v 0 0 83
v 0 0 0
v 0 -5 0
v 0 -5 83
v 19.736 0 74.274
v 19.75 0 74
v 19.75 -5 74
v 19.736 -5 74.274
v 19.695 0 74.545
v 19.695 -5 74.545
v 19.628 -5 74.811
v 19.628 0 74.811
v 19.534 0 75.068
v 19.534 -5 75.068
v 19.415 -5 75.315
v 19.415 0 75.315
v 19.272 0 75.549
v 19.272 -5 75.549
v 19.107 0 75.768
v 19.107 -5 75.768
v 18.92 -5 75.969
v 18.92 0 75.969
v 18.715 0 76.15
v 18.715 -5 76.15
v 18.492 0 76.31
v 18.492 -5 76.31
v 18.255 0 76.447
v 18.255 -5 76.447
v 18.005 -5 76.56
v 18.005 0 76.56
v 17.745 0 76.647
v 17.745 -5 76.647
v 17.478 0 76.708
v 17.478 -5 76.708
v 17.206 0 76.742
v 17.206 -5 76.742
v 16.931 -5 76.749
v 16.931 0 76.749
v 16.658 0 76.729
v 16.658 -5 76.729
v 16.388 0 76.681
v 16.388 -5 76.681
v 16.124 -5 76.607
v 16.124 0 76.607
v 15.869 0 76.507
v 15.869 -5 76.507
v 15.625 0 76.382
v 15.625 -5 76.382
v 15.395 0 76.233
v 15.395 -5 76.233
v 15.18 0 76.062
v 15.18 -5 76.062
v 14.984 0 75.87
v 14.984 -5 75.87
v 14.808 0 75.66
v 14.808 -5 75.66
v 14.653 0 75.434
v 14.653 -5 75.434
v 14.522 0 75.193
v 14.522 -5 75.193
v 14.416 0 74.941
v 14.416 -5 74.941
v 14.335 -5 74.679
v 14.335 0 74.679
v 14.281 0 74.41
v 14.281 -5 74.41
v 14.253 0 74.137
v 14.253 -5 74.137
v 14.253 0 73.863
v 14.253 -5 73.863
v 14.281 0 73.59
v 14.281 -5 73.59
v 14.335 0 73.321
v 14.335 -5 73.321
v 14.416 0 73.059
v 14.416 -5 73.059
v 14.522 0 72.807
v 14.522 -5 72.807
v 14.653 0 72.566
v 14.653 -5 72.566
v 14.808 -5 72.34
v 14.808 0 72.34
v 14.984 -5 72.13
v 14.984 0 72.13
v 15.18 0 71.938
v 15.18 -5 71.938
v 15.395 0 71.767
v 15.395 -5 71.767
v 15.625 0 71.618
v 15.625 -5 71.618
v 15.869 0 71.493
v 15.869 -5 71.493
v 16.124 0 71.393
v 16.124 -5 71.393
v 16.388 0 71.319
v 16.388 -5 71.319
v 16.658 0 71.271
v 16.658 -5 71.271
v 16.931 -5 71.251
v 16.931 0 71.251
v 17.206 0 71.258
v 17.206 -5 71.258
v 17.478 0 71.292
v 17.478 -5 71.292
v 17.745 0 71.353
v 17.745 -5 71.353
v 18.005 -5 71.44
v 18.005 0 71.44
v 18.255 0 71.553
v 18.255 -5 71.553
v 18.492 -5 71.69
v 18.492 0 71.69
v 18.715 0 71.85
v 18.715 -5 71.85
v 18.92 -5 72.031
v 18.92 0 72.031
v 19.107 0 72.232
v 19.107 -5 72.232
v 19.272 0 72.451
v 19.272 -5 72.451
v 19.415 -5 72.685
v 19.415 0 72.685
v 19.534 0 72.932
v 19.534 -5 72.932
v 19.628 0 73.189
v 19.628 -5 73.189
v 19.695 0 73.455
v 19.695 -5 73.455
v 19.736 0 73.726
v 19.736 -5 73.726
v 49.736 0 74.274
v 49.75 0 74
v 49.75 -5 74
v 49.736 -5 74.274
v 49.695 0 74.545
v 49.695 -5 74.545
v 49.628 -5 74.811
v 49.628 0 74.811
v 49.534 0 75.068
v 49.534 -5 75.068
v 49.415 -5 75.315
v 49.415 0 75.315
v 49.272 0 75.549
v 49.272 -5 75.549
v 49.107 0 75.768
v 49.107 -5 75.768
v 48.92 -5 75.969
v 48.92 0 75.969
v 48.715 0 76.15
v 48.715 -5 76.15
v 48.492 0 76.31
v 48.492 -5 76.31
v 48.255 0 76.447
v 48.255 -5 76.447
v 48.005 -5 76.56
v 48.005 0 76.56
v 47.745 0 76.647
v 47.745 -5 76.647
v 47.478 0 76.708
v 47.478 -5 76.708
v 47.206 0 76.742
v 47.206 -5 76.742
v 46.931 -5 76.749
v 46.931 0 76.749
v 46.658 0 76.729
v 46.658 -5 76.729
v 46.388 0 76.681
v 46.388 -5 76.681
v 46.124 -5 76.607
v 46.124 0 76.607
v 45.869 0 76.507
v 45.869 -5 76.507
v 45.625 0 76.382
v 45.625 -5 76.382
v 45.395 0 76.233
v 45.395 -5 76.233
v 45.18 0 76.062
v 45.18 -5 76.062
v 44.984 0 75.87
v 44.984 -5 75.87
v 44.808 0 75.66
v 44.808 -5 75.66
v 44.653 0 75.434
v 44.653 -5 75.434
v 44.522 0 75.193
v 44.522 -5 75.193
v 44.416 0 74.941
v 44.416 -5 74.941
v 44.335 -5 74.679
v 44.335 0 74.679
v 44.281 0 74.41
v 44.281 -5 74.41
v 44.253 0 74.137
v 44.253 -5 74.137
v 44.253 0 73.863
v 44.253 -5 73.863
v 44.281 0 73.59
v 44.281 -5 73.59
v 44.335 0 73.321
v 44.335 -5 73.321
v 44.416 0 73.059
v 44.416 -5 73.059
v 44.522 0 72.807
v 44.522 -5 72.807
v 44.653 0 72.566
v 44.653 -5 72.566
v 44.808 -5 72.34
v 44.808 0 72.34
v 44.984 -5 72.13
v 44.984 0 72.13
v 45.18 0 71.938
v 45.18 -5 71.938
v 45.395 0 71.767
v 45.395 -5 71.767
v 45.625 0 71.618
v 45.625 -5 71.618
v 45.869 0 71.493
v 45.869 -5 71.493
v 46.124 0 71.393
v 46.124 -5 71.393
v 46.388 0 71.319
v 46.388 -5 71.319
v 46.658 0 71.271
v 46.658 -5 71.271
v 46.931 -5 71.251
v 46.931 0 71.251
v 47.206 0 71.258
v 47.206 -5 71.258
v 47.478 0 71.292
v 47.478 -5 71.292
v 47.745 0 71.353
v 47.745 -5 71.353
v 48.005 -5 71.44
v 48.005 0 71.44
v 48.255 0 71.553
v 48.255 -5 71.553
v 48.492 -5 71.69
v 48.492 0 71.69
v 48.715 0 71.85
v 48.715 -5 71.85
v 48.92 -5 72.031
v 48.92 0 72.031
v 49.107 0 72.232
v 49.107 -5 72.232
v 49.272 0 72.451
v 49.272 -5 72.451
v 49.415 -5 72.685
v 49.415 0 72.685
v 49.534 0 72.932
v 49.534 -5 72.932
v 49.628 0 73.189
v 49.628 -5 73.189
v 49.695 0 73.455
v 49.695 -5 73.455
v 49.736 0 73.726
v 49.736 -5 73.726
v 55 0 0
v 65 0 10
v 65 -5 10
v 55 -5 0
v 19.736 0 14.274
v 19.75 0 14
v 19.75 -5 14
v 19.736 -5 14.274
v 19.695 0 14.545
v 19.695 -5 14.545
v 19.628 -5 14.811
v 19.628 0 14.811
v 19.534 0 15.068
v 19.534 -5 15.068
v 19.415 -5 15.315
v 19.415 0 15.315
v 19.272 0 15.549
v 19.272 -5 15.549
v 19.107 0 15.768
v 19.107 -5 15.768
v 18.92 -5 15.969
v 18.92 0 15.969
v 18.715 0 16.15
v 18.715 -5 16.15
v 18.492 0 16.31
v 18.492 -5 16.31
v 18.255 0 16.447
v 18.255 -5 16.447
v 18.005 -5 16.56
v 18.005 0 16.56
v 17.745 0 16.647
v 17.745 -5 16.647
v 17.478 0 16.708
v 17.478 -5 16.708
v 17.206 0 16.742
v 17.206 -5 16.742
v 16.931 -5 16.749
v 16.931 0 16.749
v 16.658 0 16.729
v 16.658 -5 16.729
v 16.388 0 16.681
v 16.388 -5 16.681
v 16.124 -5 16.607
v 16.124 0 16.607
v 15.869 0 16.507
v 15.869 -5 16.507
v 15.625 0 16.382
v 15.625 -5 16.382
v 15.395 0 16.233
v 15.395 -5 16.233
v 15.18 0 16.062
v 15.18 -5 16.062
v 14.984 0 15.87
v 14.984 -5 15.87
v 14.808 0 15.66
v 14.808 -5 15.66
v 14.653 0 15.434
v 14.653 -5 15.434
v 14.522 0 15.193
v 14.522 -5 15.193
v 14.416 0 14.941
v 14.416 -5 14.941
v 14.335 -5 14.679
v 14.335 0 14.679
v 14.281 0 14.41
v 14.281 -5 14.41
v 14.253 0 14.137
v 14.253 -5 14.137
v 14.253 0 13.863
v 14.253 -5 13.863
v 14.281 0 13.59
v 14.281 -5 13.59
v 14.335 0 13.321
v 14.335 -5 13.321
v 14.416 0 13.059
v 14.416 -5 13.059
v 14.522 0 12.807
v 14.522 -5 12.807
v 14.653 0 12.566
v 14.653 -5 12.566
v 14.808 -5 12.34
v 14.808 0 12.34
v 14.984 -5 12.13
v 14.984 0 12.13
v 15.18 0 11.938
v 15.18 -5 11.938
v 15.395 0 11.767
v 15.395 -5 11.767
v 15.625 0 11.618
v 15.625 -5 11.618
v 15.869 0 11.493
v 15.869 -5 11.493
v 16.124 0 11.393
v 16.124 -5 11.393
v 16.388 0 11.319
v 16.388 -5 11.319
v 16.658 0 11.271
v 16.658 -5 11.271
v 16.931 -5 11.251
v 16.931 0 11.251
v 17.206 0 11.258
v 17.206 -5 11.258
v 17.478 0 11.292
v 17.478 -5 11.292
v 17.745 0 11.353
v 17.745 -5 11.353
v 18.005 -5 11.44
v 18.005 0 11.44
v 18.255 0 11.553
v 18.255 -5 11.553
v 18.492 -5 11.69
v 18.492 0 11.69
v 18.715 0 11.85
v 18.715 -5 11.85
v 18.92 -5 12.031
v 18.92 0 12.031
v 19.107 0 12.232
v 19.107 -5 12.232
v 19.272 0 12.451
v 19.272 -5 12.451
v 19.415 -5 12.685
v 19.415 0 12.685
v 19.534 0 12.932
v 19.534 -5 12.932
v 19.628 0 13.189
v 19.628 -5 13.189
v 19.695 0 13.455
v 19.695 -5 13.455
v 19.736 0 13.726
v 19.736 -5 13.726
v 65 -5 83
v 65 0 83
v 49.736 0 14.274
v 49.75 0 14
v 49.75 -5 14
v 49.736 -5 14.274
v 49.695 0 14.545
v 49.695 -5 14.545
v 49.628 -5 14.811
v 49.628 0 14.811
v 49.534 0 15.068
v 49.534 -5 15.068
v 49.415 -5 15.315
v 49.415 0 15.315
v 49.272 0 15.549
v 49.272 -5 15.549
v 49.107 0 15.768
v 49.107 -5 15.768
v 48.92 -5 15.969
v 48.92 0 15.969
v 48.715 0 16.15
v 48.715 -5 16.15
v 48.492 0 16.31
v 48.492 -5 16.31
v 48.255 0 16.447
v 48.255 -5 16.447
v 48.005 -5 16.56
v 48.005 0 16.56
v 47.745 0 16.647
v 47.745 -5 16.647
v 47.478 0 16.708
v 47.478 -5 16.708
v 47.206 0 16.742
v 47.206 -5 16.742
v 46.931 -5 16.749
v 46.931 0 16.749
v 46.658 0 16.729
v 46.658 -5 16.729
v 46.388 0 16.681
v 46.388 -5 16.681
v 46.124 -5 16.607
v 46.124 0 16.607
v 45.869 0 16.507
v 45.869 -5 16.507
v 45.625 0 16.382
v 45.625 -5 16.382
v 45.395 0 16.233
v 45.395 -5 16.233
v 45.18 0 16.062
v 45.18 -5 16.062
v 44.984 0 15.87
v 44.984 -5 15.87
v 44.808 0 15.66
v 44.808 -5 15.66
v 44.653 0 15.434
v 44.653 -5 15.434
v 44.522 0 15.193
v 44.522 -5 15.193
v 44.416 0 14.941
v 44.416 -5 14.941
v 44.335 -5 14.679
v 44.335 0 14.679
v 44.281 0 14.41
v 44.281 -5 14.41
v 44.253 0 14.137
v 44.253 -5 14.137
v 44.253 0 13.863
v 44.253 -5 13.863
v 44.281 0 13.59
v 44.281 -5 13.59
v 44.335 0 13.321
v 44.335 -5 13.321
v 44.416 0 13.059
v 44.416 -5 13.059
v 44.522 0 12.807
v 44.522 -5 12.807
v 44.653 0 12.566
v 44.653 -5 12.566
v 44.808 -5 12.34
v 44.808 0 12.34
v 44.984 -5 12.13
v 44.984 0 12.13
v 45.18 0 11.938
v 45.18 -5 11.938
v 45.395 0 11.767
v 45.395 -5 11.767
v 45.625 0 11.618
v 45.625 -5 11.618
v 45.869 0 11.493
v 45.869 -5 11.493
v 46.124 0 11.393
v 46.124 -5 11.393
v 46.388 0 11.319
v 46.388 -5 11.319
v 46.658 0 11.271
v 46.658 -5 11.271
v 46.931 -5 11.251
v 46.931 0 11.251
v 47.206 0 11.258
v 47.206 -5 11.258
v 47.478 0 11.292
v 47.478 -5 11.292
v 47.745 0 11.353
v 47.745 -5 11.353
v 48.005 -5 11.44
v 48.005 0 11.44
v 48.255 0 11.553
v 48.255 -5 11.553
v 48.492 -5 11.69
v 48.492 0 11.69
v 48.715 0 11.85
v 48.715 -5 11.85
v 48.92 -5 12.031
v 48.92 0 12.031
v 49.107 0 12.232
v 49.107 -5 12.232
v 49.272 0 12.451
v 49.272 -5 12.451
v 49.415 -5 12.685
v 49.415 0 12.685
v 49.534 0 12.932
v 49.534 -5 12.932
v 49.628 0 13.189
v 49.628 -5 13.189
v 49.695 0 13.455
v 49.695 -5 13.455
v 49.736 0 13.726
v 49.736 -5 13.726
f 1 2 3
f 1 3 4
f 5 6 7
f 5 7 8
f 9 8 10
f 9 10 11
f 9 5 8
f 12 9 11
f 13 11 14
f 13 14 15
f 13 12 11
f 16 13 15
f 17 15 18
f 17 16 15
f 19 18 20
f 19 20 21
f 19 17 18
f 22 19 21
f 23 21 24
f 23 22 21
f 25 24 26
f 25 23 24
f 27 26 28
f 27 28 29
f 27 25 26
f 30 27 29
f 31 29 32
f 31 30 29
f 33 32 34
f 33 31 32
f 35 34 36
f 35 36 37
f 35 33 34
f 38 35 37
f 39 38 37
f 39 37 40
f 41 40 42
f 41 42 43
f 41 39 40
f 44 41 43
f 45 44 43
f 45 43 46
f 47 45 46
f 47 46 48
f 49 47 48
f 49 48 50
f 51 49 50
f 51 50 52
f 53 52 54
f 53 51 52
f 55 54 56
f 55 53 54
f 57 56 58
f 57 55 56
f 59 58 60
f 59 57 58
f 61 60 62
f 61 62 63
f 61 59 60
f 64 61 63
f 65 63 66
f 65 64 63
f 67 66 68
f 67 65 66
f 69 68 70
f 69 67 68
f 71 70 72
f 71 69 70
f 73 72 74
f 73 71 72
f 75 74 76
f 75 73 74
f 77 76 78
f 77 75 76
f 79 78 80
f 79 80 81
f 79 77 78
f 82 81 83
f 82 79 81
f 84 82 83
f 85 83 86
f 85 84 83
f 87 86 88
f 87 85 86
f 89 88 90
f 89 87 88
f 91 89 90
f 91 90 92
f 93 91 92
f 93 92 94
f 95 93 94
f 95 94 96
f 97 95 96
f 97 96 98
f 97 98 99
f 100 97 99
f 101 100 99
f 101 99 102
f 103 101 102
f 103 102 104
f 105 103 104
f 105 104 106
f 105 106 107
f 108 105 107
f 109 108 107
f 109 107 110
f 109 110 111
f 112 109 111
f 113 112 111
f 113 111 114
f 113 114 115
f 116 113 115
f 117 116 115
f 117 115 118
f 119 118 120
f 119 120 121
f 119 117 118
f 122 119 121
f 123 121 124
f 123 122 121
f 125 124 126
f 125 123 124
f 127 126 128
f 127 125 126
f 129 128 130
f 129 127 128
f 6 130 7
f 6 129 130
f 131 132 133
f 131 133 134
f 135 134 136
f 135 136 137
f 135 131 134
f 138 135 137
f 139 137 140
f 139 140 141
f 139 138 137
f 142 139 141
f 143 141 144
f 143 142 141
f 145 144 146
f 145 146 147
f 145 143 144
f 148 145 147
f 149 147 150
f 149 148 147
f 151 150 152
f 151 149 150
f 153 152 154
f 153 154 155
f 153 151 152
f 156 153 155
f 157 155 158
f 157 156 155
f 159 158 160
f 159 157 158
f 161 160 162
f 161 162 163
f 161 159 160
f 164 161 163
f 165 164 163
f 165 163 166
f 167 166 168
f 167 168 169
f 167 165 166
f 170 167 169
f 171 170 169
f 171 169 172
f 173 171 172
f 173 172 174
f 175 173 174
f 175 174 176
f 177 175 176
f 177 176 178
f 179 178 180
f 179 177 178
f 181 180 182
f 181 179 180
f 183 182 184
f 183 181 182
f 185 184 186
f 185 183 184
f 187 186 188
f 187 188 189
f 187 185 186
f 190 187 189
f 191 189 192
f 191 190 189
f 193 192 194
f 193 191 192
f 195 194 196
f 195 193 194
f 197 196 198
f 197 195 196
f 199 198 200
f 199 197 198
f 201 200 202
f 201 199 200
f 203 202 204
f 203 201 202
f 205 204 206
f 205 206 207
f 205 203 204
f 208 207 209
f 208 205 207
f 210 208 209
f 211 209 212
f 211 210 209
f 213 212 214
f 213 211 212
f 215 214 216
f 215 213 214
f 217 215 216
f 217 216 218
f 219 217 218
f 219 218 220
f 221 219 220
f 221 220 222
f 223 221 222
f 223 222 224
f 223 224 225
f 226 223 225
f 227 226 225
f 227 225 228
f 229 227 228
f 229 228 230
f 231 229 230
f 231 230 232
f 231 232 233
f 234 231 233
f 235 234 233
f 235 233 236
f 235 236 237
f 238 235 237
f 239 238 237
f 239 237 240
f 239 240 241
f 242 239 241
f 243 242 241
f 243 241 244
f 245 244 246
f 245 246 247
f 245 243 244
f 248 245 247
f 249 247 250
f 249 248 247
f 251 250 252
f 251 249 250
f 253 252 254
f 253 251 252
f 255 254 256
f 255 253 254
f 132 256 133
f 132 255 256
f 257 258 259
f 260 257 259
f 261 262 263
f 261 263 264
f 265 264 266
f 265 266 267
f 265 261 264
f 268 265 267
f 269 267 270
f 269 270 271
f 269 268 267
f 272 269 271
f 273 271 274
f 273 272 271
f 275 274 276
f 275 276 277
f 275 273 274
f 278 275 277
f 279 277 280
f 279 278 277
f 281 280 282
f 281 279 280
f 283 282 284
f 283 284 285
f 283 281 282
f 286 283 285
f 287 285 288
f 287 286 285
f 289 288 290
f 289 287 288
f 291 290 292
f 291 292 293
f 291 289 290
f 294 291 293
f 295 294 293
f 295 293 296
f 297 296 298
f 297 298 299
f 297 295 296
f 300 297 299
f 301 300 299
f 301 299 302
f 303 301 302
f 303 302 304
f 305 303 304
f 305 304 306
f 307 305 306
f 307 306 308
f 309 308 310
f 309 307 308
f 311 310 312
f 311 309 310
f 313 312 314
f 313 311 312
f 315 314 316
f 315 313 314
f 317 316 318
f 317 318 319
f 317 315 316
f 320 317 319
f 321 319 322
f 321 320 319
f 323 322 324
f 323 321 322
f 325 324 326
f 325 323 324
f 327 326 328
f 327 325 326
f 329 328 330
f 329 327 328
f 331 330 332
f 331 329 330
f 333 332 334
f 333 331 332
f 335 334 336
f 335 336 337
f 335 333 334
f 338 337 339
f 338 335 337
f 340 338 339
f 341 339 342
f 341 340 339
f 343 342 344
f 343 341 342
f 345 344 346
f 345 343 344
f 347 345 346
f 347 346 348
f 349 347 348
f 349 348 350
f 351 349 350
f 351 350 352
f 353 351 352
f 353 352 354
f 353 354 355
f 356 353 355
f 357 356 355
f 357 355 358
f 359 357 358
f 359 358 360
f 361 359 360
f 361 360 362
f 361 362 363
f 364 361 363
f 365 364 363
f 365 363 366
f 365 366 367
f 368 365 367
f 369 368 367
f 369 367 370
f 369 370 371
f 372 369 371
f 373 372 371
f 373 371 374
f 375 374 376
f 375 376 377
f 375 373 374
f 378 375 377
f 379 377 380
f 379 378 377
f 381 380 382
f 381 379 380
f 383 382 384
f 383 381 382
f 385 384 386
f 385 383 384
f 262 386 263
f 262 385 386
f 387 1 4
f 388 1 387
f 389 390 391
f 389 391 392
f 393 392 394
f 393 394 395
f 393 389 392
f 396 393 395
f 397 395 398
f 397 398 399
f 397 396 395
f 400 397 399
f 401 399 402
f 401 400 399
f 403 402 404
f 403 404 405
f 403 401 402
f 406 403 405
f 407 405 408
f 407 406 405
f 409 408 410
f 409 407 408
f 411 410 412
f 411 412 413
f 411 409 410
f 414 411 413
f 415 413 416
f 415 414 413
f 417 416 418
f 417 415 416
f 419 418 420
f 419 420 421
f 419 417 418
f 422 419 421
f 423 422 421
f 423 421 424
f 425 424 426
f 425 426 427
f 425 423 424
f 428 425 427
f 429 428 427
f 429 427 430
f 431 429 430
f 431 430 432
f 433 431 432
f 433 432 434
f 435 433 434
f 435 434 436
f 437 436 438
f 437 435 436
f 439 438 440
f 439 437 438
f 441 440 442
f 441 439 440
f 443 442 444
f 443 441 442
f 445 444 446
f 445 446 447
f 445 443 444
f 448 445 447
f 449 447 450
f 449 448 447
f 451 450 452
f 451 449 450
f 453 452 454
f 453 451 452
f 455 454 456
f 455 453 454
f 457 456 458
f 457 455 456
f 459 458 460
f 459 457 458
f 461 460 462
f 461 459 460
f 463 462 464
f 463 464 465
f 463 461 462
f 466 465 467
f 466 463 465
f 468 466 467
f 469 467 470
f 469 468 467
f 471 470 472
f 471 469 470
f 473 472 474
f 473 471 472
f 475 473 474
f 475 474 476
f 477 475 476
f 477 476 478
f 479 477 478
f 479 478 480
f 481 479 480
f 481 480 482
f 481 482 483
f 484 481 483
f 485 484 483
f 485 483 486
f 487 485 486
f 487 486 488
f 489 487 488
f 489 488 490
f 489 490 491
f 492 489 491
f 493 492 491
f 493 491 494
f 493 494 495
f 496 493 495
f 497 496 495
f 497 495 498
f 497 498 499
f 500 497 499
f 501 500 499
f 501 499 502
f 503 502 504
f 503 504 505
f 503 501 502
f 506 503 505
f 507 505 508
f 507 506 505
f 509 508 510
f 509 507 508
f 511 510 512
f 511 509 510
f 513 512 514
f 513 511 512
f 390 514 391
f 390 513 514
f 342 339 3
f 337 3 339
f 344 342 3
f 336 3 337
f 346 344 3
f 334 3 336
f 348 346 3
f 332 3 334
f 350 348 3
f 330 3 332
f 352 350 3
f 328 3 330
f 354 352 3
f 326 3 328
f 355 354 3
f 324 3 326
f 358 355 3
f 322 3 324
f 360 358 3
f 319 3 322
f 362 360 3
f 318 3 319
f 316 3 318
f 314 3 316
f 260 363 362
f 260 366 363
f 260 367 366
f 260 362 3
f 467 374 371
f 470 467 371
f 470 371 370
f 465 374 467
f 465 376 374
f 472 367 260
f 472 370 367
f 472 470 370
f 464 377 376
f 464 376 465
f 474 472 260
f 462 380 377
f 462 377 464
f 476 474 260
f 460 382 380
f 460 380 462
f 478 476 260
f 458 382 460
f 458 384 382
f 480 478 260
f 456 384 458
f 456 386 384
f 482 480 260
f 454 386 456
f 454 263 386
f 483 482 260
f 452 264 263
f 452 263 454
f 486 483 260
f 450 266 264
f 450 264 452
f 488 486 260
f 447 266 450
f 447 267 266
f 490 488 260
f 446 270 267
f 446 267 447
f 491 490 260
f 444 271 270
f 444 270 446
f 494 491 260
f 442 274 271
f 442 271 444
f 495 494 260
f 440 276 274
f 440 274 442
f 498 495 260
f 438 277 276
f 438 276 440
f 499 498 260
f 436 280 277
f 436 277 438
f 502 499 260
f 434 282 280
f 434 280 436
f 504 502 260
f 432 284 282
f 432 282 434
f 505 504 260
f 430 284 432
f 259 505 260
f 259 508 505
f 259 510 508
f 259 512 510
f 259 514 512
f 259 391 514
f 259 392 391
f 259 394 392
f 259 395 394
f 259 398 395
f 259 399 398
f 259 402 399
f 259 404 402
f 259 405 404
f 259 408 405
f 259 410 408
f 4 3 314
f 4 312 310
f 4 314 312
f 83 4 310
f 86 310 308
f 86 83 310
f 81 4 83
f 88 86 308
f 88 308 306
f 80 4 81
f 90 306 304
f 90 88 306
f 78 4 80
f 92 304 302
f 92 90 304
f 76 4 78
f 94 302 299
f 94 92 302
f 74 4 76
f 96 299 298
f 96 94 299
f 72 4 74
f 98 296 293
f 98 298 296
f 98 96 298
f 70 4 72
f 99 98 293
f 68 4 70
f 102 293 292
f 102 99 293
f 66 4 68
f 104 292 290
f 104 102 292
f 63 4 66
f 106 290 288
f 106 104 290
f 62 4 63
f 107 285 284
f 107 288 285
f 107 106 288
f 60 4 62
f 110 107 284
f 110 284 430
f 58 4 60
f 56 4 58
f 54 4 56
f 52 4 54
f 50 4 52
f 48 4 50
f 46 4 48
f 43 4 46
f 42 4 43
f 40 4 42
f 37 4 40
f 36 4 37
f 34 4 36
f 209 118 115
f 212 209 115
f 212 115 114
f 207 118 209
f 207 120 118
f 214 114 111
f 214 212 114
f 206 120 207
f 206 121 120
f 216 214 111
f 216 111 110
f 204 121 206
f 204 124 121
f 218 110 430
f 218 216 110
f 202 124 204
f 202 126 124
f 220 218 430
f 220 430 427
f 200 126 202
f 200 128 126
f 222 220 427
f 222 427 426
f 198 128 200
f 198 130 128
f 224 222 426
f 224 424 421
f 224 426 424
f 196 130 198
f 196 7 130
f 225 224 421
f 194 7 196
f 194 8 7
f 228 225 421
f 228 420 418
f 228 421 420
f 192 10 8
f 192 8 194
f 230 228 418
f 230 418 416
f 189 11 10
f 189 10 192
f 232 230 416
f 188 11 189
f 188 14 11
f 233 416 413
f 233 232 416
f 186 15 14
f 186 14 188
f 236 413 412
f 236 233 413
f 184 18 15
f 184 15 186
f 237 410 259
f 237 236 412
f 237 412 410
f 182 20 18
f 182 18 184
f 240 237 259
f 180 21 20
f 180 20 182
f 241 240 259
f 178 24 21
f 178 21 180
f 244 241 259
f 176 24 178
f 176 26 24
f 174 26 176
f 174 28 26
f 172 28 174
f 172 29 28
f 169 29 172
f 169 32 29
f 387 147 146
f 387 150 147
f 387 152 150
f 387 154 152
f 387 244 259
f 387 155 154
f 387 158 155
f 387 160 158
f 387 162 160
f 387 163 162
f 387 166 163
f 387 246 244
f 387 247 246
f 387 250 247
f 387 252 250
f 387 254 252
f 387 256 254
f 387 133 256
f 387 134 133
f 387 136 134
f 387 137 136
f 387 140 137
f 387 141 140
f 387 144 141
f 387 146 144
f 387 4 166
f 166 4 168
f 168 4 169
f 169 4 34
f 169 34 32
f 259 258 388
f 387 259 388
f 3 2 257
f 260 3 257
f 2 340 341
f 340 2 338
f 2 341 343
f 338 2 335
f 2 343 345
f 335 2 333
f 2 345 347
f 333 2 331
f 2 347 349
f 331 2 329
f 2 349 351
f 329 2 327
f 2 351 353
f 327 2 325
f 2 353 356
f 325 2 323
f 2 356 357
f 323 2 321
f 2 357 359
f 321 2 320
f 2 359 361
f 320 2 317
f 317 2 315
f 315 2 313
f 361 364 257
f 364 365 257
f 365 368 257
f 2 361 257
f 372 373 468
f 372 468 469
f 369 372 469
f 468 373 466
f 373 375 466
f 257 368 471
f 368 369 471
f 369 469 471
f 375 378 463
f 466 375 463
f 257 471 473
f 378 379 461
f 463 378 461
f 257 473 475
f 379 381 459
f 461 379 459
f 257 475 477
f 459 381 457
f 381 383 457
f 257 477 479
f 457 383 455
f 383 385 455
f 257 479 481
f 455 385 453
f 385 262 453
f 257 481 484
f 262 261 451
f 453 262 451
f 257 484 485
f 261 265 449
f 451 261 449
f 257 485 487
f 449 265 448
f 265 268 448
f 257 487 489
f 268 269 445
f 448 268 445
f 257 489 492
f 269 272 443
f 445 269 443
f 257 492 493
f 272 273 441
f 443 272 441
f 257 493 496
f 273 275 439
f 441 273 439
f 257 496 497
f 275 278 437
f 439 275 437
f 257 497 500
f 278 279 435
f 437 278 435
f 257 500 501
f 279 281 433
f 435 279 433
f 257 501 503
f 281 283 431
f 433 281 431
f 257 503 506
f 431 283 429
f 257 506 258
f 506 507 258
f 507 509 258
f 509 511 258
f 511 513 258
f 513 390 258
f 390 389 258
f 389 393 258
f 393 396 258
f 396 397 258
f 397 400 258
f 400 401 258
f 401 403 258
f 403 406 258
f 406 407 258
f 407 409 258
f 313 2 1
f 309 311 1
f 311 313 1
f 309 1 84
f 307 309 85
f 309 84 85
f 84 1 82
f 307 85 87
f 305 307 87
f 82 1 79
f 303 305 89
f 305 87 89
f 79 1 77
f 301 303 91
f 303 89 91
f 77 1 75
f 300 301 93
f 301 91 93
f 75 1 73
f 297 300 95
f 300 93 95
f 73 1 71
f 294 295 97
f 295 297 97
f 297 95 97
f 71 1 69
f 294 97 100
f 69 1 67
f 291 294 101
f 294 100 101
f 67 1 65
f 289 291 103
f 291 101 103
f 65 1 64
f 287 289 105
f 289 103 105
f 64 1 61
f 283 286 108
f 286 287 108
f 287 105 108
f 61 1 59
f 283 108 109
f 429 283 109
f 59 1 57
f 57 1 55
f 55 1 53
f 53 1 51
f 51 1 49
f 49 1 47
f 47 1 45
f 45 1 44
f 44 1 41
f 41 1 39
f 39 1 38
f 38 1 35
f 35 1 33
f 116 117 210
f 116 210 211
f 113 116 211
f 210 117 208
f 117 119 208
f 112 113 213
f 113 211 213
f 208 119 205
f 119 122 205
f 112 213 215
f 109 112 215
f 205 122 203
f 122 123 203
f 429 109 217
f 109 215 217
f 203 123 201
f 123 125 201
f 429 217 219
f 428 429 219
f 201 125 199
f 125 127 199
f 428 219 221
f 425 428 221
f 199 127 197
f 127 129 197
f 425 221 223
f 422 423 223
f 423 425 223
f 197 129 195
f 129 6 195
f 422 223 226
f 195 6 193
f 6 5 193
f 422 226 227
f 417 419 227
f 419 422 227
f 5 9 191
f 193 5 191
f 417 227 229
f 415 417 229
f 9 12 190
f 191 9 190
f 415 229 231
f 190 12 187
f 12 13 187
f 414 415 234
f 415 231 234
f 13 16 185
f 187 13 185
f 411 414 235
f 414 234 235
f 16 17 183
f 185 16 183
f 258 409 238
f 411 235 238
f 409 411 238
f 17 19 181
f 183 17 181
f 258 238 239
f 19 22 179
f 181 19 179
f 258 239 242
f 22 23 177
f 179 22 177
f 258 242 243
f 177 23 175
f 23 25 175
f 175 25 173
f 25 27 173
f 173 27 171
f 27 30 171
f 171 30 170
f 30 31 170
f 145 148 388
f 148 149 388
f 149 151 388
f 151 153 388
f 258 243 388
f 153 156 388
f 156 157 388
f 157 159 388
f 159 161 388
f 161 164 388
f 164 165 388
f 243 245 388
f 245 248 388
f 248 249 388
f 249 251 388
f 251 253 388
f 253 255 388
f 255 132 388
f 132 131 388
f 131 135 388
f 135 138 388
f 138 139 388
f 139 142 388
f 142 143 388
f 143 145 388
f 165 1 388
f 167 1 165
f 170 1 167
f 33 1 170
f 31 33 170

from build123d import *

# Parameters (mm, degrees)
F0_W     = 65
F0_H     = 83
F0_R     = 2.75
F1_DEPTH = 5
F2_SIZE  = 10


with BuildPart() as f1:
    # F0 (on Front) → F1 (new body)
    with BuildSketch(Plane.XZ):
        with Locations((32.5, 41.5)):
            Rectangle(F0_W, F0_H)
        with Locations((17, 14)):
            Circle(F0_R, mode=Mode.SUBTRACT)
        with Locations((47, 14)):
            Circle(F0_R, mode=Mode.SUBTRACT)
        with Locations((17, 74)):
            Circle(F0_R, mode=Mode.SUBTRACT)
        with Locations((47, 74)):
            Circle(F0_R, mode=Mode.SUBTRACT)
    extrude(amount=F1_DEPTH)

    # F2
    f2_edges = [f1.edges().sort_by_distance(p)[0] for p in [
        (65, -2.5, 0),
    ]]
    chamfer(f2_edges, length=F2_SIZE)


solid = f1.part
